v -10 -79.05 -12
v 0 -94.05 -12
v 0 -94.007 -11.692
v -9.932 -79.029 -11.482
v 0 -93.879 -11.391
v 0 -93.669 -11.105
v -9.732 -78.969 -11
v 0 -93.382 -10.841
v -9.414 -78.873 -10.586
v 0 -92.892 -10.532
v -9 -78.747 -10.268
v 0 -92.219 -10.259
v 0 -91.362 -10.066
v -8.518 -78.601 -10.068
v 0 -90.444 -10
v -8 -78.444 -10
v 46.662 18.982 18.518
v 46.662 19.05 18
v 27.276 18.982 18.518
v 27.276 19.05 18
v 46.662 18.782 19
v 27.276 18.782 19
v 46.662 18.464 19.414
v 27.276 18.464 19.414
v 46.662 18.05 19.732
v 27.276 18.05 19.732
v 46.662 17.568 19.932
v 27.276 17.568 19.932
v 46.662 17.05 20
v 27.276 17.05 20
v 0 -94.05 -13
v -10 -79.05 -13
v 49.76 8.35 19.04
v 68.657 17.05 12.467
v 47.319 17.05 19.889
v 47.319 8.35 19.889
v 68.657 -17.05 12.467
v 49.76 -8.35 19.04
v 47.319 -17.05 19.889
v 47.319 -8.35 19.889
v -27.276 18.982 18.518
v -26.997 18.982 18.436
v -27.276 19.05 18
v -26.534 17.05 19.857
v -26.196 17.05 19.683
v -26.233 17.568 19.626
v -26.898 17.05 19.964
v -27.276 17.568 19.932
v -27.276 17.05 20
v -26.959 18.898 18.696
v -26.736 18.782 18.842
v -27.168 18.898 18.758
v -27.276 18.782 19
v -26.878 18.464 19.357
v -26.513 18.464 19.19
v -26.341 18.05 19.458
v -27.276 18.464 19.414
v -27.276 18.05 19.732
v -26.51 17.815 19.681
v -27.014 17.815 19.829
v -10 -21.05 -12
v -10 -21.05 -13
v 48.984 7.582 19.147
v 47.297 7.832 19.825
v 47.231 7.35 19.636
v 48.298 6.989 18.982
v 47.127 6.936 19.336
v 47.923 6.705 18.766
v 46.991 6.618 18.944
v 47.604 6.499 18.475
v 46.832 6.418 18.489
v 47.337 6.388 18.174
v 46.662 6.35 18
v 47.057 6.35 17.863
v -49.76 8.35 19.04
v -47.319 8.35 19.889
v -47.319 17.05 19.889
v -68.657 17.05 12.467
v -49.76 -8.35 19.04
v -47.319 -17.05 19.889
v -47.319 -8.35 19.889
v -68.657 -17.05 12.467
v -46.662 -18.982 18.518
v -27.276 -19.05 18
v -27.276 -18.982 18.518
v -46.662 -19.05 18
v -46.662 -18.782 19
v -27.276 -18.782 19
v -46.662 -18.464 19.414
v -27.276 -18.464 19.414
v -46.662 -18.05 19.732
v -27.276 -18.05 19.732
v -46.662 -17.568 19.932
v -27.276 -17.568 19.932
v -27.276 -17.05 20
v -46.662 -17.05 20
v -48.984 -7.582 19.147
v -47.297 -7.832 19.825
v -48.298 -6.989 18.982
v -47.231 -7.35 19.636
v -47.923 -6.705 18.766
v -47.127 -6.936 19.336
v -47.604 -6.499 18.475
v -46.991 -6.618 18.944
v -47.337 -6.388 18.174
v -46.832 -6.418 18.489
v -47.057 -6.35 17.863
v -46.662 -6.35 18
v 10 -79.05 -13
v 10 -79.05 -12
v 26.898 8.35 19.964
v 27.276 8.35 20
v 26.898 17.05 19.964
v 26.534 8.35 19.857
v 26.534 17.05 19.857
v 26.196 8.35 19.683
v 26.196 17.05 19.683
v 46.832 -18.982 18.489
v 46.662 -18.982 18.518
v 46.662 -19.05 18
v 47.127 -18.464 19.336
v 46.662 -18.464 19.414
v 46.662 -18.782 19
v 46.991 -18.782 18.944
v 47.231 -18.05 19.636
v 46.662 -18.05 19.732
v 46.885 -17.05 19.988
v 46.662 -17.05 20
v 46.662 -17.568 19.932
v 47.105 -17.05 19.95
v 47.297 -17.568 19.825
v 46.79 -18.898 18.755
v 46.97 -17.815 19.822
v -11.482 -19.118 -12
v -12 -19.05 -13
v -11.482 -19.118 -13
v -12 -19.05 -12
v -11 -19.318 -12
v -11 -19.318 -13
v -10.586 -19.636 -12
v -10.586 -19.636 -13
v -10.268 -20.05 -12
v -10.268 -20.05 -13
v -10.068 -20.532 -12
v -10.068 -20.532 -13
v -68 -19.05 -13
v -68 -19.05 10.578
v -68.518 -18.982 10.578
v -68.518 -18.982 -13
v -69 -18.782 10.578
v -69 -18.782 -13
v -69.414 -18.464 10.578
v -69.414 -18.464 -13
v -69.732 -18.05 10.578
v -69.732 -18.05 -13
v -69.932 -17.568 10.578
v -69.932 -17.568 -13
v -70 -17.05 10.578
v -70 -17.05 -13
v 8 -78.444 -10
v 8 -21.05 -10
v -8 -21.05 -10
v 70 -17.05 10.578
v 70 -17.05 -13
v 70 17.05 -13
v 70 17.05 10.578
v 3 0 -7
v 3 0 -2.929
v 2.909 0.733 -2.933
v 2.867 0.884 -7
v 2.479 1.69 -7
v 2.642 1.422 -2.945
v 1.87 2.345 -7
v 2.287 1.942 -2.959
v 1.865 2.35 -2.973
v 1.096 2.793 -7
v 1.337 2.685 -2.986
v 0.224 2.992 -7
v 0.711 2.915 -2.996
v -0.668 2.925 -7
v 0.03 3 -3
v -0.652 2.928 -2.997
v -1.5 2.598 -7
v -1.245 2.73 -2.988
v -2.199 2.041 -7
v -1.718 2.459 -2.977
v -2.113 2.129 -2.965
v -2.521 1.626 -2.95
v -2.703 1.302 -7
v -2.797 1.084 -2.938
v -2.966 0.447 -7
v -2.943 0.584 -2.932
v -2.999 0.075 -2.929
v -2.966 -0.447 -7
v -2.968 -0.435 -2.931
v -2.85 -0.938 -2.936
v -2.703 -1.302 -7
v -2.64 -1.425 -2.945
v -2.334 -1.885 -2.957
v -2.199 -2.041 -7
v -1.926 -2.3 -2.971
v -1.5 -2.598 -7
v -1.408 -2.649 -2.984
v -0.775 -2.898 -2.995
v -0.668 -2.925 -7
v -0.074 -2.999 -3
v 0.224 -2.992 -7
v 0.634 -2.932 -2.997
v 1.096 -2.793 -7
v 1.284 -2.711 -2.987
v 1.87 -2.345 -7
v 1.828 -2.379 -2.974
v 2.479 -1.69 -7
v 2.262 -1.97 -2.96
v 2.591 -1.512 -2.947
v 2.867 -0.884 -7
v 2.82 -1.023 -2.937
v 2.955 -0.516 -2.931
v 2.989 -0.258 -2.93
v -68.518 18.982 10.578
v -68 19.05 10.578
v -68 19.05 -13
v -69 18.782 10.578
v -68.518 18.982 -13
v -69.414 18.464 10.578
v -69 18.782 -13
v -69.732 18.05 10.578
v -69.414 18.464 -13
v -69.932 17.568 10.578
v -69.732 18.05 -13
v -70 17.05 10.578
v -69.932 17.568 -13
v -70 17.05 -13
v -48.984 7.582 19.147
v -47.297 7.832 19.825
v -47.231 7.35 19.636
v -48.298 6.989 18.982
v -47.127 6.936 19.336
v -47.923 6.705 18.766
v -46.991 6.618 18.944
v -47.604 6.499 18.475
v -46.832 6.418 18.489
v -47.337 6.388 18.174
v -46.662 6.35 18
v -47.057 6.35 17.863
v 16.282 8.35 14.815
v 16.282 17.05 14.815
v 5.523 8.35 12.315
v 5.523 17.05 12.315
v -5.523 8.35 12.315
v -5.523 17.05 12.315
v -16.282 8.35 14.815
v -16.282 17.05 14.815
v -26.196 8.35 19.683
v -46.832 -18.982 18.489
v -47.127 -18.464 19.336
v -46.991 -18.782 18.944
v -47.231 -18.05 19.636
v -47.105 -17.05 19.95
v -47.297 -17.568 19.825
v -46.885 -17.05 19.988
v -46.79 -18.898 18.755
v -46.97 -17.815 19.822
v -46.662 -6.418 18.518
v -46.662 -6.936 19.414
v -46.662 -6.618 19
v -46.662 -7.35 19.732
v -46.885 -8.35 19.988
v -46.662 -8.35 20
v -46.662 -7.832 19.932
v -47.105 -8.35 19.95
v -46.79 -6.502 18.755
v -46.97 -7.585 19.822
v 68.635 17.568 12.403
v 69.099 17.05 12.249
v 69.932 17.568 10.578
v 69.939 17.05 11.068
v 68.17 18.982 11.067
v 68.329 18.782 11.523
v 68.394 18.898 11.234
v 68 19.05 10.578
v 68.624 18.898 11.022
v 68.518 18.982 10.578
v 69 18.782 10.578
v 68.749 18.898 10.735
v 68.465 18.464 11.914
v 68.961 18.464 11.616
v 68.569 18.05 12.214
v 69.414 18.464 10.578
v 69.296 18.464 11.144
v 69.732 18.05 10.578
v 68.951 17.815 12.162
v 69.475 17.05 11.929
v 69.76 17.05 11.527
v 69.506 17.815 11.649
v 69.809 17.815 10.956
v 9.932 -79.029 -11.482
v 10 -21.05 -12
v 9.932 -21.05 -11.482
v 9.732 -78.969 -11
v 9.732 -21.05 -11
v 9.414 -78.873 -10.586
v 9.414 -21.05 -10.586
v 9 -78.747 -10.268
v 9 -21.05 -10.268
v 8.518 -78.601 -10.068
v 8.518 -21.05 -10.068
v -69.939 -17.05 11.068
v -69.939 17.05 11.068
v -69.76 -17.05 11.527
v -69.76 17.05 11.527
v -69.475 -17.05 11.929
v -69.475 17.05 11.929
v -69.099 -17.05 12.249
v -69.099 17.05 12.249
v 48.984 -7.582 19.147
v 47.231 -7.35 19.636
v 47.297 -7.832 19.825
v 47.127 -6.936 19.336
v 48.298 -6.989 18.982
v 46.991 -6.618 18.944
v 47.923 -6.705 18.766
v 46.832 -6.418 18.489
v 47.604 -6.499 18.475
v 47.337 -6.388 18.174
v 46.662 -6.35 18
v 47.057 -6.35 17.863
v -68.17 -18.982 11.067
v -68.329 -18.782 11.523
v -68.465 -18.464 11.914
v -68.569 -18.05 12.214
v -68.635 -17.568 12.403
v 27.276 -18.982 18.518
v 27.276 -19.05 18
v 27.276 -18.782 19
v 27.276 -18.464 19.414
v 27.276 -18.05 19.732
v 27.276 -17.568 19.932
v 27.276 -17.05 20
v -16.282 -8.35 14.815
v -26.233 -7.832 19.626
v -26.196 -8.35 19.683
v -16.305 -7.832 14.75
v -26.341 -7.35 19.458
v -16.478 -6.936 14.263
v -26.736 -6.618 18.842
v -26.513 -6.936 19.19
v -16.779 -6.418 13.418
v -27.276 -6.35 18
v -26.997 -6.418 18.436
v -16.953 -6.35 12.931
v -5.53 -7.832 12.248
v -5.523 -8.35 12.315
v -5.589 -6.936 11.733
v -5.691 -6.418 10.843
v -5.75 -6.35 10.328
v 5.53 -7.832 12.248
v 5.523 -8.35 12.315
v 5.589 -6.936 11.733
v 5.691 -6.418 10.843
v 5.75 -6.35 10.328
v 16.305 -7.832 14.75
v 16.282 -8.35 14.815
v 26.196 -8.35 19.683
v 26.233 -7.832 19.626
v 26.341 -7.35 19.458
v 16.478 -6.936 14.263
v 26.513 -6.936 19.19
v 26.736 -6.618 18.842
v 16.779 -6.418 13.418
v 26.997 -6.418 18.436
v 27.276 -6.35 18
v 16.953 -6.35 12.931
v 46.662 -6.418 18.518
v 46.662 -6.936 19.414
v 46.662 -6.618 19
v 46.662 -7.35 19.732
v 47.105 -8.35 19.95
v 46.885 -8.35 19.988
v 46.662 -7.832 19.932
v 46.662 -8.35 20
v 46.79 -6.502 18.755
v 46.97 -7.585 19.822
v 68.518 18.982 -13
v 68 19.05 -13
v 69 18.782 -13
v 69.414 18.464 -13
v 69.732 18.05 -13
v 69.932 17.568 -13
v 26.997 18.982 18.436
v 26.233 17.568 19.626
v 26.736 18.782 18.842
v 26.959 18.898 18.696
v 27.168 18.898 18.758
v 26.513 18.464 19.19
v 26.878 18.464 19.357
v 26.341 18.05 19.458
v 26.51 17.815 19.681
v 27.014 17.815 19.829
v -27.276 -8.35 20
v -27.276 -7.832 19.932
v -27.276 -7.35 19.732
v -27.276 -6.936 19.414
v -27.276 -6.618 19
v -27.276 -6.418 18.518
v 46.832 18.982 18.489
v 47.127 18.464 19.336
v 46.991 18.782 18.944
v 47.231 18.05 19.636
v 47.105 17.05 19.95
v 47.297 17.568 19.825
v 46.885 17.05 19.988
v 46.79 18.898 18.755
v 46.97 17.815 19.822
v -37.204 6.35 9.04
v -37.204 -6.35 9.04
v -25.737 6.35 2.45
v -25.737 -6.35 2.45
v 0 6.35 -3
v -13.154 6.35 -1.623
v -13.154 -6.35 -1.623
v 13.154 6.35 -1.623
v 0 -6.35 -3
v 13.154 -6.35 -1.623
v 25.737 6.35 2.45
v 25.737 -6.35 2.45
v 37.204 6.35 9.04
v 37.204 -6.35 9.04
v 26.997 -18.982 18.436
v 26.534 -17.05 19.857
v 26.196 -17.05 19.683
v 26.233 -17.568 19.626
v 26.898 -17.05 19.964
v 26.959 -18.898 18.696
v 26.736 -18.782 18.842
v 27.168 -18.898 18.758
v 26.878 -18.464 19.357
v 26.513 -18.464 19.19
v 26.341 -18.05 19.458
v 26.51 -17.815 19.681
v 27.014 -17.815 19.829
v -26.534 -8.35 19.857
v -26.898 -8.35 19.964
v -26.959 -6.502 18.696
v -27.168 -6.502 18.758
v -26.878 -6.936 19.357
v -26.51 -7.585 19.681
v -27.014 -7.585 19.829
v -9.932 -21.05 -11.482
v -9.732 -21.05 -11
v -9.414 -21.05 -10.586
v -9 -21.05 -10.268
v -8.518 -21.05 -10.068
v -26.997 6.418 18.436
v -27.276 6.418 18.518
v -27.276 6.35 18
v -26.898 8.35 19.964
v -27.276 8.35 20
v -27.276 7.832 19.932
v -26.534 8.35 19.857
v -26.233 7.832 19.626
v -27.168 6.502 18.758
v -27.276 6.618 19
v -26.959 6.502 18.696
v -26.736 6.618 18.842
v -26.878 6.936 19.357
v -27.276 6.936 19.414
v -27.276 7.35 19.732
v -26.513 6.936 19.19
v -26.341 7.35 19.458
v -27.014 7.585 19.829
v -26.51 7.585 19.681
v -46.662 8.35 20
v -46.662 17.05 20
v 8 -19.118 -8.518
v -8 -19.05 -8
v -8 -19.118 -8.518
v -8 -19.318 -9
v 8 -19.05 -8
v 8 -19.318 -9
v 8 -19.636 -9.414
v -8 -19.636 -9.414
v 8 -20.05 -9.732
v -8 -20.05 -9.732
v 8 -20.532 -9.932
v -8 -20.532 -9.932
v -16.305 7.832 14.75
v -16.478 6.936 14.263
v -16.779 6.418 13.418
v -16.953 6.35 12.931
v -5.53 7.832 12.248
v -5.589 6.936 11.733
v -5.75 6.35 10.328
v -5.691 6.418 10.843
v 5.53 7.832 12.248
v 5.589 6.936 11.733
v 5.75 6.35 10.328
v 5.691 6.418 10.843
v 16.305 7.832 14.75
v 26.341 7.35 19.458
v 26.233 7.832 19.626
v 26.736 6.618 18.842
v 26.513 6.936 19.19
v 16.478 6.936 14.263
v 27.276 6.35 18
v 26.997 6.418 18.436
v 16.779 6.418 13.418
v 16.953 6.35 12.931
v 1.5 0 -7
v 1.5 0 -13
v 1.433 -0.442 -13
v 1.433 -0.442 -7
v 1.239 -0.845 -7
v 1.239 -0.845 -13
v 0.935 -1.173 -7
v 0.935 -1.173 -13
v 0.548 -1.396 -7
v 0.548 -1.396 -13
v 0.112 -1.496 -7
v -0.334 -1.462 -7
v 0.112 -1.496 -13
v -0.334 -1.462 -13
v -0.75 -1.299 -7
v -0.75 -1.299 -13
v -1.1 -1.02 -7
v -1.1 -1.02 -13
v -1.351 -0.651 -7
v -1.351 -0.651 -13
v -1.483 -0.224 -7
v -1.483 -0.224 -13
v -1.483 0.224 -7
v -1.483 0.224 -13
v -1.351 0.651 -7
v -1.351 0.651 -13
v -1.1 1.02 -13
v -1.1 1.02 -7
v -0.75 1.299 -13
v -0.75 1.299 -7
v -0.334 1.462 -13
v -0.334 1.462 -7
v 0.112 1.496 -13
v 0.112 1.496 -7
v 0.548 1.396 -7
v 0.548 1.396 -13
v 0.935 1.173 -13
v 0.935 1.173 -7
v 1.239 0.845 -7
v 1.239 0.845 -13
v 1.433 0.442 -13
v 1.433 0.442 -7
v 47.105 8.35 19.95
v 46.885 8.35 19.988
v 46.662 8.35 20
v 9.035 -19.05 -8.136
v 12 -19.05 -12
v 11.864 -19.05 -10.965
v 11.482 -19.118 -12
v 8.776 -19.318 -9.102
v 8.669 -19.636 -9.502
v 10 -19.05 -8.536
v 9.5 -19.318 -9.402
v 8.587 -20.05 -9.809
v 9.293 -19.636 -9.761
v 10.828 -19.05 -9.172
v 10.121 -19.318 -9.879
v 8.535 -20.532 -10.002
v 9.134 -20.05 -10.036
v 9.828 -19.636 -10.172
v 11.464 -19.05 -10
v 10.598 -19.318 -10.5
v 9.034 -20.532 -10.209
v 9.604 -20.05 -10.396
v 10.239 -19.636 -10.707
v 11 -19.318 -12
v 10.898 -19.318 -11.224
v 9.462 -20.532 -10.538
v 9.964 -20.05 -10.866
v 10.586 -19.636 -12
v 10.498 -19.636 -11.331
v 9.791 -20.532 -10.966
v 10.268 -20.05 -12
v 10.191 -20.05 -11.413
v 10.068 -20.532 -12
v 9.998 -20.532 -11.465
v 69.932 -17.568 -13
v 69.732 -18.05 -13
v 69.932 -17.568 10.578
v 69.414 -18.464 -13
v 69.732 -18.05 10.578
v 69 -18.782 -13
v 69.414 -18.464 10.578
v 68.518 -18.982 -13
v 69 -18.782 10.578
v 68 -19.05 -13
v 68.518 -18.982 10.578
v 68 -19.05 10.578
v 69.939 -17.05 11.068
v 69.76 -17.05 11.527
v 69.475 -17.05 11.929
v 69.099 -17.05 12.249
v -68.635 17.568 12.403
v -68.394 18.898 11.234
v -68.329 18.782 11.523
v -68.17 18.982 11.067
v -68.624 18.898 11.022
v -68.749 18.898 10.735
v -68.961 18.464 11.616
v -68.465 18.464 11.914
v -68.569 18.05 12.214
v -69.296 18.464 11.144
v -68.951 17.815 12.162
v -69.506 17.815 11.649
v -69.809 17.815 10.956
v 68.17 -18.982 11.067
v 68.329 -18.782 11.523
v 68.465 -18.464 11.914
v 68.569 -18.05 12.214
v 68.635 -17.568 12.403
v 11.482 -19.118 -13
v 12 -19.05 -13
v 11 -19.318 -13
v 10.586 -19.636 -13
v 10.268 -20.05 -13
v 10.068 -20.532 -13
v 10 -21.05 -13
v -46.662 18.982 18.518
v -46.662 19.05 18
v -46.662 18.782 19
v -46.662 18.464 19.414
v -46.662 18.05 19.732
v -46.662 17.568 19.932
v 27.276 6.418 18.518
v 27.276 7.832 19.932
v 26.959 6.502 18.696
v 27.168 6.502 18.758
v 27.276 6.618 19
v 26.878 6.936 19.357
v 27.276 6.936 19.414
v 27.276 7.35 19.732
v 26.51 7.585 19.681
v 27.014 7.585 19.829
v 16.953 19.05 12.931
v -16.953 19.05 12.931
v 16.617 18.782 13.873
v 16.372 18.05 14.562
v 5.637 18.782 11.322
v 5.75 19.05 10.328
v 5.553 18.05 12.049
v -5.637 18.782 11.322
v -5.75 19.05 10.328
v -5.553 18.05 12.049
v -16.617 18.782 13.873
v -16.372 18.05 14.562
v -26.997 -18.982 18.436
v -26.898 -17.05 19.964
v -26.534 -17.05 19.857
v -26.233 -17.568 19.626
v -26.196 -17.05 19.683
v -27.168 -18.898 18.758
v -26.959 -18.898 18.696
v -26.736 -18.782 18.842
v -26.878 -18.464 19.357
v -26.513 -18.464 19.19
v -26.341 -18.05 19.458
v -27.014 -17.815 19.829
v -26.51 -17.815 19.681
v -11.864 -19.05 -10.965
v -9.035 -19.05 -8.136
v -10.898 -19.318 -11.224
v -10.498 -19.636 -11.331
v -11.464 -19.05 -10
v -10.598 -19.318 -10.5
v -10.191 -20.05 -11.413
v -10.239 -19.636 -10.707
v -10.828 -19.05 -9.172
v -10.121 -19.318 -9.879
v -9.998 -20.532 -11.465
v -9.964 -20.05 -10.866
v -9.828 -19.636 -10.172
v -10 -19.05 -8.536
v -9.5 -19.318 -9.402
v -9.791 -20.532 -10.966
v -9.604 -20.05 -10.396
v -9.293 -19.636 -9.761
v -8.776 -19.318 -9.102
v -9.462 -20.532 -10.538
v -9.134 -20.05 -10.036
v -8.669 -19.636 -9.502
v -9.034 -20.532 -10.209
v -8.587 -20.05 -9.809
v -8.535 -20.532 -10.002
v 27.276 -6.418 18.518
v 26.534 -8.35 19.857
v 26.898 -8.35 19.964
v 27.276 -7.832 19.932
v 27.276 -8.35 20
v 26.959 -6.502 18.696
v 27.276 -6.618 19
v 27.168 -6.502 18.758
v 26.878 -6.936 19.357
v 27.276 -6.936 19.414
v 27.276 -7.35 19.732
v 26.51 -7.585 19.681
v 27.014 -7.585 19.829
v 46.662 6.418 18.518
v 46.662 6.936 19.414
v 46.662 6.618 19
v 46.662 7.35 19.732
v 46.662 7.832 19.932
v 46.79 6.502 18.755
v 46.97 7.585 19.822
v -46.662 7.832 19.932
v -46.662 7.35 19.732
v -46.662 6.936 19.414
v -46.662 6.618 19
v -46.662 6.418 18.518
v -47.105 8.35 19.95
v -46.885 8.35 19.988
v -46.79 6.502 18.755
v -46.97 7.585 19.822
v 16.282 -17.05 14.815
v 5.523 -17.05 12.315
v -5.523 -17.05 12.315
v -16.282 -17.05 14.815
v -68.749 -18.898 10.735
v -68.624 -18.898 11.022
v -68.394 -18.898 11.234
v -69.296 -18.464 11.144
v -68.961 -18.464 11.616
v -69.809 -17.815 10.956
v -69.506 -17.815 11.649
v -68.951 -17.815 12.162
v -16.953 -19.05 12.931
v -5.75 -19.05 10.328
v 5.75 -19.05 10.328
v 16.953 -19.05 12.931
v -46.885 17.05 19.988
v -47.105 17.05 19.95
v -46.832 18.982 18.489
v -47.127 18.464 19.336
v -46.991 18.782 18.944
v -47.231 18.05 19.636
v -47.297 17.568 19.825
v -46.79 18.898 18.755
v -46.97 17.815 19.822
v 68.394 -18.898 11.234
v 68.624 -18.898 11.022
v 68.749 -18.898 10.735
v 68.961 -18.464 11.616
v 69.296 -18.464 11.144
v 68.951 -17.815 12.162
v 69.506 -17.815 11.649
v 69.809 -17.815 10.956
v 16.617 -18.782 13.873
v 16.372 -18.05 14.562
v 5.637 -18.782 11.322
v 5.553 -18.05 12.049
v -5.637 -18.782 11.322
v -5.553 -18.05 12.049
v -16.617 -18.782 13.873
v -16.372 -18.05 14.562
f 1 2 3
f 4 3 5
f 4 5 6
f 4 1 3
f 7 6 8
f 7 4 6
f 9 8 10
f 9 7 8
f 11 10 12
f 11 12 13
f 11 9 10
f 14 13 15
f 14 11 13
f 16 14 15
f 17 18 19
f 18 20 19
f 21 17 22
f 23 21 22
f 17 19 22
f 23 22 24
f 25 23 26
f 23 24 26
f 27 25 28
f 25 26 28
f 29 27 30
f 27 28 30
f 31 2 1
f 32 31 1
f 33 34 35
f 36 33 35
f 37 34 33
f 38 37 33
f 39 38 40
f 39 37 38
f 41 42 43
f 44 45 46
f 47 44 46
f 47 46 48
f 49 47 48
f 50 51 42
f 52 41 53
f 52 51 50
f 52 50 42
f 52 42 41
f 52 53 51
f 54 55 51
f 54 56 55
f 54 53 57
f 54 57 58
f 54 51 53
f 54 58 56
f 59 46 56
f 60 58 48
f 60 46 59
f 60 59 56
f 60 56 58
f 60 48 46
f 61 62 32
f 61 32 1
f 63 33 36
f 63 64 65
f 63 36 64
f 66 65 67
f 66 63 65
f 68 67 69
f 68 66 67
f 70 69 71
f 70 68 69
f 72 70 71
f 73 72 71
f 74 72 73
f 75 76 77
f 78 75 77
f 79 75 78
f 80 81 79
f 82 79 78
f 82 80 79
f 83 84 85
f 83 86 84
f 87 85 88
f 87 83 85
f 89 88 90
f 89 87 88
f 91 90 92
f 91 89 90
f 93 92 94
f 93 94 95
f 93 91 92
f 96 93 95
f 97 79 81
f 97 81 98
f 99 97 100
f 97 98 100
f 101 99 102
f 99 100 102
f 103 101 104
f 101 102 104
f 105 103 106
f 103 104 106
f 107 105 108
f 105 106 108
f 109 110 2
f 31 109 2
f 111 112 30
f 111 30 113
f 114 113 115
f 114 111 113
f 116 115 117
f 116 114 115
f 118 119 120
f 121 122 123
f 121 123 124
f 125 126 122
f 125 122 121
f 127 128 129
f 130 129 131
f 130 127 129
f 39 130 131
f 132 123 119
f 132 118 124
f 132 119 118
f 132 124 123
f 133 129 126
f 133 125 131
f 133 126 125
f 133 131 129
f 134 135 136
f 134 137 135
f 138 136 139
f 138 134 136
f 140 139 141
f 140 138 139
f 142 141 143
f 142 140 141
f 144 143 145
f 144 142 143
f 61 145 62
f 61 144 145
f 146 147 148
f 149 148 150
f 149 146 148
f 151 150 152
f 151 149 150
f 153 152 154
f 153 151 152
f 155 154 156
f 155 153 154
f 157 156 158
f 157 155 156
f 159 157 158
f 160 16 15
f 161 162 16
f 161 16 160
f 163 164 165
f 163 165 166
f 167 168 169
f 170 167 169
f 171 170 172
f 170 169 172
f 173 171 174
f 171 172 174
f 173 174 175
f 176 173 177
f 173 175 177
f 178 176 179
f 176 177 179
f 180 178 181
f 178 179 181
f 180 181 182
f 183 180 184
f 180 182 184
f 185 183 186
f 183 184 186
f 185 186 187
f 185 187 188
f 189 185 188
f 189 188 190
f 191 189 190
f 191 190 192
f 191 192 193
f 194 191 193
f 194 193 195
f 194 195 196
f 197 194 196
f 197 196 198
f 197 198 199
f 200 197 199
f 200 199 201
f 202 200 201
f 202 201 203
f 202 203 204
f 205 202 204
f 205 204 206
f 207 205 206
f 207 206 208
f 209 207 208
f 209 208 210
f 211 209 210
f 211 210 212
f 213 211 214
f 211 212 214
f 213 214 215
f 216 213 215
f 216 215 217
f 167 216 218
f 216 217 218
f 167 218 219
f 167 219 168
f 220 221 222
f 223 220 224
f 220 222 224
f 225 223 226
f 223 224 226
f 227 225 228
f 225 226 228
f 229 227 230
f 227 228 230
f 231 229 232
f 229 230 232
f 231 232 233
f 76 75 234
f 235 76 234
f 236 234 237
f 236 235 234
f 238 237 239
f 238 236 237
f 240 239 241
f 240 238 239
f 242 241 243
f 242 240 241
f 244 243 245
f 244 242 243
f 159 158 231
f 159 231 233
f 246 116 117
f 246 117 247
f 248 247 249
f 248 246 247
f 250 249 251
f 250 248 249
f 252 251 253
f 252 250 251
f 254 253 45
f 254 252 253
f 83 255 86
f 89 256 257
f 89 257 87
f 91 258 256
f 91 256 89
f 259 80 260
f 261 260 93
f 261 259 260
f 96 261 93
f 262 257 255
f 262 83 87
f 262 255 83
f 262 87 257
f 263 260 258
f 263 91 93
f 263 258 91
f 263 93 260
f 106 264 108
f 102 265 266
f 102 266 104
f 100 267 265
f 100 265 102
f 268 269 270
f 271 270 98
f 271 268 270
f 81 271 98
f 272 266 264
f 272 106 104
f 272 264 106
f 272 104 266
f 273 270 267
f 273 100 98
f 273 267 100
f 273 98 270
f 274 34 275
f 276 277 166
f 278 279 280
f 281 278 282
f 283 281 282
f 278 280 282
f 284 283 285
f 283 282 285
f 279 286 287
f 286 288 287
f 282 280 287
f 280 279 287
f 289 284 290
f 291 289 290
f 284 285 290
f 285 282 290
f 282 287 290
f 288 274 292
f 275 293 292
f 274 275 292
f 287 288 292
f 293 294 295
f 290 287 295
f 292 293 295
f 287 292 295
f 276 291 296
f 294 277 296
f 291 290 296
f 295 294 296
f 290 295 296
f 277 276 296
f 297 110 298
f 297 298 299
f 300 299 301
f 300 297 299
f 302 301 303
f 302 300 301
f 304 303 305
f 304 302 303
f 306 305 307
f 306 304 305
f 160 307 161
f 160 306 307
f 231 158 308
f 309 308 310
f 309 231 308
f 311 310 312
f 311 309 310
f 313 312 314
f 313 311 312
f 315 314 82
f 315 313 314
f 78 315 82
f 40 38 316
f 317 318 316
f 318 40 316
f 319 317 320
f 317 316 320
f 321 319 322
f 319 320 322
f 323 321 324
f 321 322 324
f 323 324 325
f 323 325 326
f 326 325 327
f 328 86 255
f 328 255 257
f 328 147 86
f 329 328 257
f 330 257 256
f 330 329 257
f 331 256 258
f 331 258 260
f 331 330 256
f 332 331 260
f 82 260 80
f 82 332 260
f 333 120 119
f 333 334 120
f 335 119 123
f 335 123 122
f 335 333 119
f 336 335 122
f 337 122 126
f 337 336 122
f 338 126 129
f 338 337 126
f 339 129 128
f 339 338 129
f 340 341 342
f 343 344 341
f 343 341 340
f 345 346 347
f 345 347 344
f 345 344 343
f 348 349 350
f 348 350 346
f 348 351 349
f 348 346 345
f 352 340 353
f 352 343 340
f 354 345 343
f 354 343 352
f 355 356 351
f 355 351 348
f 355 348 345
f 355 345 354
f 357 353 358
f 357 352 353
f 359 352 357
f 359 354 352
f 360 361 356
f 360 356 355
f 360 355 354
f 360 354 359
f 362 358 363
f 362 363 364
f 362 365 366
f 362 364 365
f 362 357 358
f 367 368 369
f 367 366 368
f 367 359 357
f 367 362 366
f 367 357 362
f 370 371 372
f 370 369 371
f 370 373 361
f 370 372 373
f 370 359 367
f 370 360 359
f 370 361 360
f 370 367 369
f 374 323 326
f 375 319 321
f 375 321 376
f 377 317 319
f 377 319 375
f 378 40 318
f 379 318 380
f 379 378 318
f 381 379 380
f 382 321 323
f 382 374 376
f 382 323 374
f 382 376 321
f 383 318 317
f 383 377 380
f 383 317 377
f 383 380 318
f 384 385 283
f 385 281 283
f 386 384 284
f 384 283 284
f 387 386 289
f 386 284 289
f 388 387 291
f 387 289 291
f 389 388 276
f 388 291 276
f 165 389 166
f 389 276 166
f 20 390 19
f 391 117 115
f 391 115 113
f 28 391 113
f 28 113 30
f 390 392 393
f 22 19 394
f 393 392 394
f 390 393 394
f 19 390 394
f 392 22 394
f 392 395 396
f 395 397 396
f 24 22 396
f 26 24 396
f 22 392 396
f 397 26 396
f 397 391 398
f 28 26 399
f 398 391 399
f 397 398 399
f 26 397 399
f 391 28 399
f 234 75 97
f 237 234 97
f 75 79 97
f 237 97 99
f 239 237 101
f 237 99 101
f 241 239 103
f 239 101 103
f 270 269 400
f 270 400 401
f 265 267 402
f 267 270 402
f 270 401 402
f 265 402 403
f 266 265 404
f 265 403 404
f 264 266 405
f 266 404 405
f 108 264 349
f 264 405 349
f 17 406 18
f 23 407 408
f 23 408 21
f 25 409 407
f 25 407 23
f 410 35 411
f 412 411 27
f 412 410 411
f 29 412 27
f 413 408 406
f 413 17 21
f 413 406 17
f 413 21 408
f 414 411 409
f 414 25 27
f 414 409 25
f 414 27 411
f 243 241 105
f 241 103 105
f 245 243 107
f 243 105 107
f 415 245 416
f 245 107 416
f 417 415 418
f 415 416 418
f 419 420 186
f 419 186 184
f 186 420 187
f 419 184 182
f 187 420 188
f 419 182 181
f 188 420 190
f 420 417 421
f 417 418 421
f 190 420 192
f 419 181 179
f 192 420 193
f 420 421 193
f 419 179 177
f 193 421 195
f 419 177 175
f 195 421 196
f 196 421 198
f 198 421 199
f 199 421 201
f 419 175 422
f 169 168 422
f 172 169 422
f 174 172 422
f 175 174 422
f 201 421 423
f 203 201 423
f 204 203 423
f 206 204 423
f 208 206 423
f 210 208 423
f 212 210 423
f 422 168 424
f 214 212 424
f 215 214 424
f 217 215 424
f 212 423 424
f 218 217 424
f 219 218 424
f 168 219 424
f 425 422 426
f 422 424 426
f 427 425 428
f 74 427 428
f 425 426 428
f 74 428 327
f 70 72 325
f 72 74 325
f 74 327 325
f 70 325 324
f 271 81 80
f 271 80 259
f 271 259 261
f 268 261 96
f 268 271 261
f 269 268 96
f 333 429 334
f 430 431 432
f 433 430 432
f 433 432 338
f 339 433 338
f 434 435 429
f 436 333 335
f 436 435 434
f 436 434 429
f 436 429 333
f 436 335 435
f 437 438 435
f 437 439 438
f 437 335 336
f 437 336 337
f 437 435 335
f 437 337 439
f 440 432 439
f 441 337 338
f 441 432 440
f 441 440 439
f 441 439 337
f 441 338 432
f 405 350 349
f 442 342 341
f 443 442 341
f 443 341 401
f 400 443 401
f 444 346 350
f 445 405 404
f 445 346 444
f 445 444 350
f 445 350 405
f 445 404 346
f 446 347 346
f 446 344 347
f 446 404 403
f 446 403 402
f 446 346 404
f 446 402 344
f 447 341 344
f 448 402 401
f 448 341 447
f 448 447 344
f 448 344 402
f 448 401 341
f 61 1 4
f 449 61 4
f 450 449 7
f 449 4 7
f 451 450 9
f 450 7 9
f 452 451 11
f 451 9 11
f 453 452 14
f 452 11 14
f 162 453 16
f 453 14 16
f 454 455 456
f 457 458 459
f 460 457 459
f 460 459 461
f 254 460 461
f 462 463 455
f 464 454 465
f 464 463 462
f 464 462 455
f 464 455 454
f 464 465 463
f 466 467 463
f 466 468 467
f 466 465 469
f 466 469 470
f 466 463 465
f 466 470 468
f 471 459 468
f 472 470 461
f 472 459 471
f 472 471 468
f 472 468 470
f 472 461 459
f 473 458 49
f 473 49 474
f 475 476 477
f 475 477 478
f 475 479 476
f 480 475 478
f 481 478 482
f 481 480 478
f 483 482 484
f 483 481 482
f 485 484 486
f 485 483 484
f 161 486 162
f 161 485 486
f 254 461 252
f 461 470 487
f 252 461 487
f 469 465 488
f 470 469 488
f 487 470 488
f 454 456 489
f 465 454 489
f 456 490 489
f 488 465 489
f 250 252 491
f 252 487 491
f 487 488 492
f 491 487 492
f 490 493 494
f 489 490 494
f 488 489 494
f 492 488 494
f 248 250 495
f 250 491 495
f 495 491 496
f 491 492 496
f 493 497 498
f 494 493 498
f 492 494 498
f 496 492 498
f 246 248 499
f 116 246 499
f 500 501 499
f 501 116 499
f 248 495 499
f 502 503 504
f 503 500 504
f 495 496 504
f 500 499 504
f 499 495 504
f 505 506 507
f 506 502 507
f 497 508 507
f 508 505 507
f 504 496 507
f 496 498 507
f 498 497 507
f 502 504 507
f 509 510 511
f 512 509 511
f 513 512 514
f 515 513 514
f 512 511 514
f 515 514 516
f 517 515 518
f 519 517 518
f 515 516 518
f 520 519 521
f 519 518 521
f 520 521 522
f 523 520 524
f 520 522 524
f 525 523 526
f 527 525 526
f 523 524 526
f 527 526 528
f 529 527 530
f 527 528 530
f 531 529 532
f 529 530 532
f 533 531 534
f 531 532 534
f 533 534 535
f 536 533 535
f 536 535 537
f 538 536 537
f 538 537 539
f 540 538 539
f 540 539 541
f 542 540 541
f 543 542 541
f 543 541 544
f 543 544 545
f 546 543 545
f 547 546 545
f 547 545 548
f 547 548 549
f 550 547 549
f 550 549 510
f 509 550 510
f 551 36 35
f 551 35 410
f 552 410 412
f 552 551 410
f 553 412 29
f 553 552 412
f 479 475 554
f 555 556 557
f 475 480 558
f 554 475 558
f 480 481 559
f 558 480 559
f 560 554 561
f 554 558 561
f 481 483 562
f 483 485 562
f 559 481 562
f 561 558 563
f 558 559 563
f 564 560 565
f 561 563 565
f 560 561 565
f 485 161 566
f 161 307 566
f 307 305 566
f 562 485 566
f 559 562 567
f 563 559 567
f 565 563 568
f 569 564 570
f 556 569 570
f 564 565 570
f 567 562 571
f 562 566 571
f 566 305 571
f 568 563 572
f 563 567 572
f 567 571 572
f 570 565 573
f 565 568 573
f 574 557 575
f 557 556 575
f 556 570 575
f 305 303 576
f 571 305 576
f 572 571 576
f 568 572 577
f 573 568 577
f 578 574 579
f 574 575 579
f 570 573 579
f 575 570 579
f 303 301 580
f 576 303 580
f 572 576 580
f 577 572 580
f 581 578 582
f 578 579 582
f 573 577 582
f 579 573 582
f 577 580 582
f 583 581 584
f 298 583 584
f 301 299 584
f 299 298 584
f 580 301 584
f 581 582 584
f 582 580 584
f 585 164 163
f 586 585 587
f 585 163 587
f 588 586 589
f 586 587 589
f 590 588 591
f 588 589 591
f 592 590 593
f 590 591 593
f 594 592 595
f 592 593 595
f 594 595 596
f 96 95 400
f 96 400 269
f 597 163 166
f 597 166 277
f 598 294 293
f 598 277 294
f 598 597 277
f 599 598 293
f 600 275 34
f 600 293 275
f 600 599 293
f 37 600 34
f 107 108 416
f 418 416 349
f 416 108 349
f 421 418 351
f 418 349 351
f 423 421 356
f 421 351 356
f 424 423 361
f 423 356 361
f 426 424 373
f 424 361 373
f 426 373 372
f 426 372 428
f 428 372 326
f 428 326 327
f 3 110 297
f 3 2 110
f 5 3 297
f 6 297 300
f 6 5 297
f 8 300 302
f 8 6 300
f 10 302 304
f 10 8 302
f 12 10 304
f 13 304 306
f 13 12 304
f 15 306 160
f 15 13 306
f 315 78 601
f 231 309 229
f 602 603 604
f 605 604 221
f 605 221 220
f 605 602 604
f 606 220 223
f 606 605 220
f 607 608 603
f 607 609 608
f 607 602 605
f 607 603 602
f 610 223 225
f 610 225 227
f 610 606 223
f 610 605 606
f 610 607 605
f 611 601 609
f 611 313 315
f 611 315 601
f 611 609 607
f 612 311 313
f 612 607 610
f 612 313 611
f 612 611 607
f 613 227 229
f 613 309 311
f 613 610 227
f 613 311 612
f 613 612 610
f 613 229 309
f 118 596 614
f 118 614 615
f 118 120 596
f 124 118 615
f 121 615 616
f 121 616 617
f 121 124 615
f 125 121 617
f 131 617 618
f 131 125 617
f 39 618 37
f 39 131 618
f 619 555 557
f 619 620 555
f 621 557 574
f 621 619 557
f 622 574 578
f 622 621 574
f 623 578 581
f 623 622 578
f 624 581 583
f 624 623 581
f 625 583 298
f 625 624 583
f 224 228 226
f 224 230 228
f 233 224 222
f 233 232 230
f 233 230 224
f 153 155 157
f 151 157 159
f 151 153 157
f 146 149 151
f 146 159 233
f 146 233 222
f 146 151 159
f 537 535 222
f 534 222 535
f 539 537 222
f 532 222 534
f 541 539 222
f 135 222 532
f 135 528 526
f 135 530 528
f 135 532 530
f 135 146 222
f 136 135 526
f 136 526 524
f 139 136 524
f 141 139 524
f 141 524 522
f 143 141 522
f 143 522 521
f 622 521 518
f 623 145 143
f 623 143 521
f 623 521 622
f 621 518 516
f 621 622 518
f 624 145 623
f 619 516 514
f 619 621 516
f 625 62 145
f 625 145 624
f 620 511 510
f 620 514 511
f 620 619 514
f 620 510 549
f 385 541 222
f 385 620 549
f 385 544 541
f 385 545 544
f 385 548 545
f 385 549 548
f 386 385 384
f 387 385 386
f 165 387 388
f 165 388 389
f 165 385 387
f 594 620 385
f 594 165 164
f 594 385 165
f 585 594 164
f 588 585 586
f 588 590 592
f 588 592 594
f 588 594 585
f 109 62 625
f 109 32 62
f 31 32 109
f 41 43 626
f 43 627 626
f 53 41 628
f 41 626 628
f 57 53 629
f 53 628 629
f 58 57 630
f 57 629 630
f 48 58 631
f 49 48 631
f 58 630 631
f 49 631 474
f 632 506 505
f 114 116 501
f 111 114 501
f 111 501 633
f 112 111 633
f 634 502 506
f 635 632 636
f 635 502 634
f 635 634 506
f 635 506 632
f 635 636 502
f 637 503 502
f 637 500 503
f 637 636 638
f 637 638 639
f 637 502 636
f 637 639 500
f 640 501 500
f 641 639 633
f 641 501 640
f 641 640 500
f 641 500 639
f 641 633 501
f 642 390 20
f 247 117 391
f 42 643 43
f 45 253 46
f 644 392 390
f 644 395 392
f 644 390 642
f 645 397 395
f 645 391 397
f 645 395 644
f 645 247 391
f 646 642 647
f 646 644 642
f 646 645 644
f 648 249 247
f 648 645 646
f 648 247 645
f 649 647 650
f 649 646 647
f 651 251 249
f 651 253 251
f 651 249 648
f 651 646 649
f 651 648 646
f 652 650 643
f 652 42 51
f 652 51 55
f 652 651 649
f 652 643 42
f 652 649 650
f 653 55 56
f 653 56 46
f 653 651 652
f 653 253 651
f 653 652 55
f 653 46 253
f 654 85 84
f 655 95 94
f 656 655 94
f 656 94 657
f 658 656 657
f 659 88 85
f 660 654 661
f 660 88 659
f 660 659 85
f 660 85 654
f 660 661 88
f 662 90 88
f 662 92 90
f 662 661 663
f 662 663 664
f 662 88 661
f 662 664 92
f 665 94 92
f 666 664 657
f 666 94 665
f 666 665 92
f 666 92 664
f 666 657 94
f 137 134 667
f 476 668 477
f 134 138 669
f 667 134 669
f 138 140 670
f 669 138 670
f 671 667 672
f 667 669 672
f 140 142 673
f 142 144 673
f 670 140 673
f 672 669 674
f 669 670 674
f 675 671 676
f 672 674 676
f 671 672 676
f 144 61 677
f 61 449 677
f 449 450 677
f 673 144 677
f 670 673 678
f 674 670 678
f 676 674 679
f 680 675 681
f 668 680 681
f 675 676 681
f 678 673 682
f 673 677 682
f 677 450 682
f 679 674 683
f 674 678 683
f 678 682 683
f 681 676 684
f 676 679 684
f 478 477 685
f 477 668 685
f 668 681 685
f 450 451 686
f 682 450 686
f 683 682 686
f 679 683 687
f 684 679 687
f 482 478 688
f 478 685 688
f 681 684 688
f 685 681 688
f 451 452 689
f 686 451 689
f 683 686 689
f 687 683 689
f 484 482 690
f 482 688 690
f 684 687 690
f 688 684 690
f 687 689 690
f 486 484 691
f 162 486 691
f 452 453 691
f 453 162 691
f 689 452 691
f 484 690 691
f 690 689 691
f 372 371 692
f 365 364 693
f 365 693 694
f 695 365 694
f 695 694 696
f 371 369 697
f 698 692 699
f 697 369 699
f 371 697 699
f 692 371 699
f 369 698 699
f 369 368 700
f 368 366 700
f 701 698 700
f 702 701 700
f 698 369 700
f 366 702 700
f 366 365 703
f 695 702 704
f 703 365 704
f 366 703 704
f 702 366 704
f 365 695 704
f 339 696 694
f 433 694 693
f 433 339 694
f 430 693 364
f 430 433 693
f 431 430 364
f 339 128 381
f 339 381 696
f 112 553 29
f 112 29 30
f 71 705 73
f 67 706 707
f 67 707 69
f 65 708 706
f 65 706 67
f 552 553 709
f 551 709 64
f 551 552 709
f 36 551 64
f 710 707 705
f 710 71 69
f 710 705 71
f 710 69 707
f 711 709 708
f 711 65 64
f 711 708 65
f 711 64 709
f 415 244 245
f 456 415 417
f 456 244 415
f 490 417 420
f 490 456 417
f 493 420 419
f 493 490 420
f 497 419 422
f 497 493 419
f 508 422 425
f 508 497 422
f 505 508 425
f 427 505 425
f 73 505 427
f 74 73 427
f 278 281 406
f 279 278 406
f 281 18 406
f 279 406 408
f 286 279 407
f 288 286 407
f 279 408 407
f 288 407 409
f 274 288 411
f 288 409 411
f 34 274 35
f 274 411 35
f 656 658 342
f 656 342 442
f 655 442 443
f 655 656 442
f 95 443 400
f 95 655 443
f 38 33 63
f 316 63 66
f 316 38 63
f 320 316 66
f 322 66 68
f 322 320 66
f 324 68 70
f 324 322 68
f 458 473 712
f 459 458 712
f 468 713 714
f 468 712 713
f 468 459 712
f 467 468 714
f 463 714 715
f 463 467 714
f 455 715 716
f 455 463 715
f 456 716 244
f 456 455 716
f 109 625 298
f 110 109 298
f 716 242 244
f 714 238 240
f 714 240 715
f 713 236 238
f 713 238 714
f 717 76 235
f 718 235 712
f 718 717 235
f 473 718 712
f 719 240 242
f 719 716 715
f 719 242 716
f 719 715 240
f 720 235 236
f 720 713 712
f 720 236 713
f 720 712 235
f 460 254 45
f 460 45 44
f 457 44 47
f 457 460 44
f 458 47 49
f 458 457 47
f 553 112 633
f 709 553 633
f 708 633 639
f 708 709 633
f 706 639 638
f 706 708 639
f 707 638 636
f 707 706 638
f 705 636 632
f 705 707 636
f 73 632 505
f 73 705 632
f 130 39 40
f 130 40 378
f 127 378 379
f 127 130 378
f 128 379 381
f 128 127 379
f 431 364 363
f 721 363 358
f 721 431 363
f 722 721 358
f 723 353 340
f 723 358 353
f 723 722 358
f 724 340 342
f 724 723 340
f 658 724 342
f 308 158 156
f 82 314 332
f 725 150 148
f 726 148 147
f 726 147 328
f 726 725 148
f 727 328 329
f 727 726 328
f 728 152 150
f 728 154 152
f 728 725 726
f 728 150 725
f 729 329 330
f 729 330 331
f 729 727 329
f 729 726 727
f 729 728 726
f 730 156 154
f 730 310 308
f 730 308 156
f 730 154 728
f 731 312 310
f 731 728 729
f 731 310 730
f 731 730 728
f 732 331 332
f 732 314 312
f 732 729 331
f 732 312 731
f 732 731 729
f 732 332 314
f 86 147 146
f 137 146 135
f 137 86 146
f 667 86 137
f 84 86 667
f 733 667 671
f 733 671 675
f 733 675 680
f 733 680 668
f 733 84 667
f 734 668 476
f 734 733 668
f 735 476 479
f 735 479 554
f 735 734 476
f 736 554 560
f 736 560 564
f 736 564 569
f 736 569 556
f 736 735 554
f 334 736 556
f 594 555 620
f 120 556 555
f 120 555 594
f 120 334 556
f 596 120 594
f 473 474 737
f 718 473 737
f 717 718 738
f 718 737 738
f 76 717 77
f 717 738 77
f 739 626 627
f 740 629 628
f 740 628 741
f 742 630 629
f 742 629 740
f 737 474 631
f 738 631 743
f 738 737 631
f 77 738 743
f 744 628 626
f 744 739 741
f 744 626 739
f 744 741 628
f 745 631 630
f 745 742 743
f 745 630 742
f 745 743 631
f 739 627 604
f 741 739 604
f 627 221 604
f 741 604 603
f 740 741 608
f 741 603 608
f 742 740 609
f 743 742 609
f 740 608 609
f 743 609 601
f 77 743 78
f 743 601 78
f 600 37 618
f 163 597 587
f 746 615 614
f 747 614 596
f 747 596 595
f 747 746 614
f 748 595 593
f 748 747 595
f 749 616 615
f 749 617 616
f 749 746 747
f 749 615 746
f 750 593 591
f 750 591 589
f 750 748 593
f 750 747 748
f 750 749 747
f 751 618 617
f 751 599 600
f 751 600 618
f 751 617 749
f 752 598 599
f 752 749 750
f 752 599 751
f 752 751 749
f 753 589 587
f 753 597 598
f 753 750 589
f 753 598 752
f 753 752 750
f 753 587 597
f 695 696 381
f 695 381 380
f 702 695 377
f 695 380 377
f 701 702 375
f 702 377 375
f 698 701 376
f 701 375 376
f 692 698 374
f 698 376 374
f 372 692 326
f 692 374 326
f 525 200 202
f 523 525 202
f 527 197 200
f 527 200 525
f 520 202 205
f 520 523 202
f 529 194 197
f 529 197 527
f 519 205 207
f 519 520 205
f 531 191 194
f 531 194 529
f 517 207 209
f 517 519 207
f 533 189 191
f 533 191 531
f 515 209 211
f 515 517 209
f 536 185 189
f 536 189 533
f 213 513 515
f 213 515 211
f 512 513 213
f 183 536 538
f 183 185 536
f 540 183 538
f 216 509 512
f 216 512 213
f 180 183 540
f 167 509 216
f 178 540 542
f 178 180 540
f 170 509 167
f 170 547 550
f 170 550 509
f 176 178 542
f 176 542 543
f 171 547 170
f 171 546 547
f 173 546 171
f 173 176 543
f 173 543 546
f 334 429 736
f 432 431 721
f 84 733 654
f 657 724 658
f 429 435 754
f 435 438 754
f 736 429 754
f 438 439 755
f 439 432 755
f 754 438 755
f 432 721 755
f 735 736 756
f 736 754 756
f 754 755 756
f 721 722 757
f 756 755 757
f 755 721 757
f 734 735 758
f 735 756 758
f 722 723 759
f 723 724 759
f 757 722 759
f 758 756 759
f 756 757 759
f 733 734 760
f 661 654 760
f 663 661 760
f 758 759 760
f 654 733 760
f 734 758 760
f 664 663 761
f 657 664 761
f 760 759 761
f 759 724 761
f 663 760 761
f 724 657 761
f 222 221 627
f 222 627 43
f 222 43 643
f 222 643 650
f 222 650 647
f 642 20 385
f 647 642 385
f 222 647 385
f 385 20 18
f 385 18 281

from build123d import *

# Parameters (mm, degrees)
F1_DEPTH  = 19.05
F2_R      = 63.5
F3_DEPTH  = 6.35
F4_R      = 2
F5_R      = 1.5
F6_DEPTH  = 33.001
F7_R      = 3
F8_DEPTH  = 7
F9_W      = 20
F9_H      = 3
F10_DEPTH = 75
F12_DEPTH = 3.001
F13_F1_R  = 2
F13_F2_R  = 2


with BuildPart() as f1:
    # F0 (on Front) → F1 (new body, symmetric)
    with BuildSketch(Plane.XZ):
        with BuildLine():
            Line((-70, -13), (70, -13))
            Line((70, -13), (70, 12))
            Line((70, 12), (47, 20))
            Line((47, 20), (26.6833281283, 20))
            ThreePointArc((26.6833281283, 20), (0, 12), (-26.6833281283, 20))
            Line((-26.6833281283, 20), (-47, 20))
            Line((-47, 20), (-70, 12))
            Line((-70, 12), (-70, -13))
        make_face()
    extrude(amount=F1_DEPTH, both=True)

    # F2 (on Front) → F3 (cut, symmetric)
    with BuildSketch(Plane.XZ):
        with Locations((0, 60.5)):
            Circle(F2_R)
    extrude(amount=F3_DEPTH, both=True, mode=Mode.SUBTRACT)

    # F4
    f4_edges = [f1.edges().sort_by_distance(p)[0] for p in [
        (-70, -19.05, -0.5),
        (-58.5, -19.05, 16),
        (-36.841664, -19.05, 20),
        (0, -19.05, 12),
        (36.841664, -19.05, 20),
        (58.5, -19.05, 16),
        (70, -19.05, -0.5),
        (70, 0, 12),
        (47, -12.7, 20),
        (26.683328, -12.7, 20),
        (26.683328, 12.7, 20),
        (47.738913, -6.35, 19.742987),
        (48.477826, 0, 19.485974),
        (47.738913, 6.35, 19.742987),
        (47, 12.7, 20),
        (58.5, 19.05, 16),
        (70, 19.05, -0.5),
        (0, 6.35, 12),
        (-26.683328, 12.7, 20),
        (0, 19.05, 12),
        (-26.683328, -12.7, 20),
        (0, -6.35, 12),
        (-47, -12.7, 20),
        (-36.841664, -6.35, 20),
        (-36.841664, 6.35, 20),
        (-47, 12.7, 20),
        (-36.841664, 19.05, 20),
        (-47.738913, 6.35, 19.742987),
        (-48.477826, 0, 19.485974),
        (-47.738913, -6.35, 19.742987),
        (-70, 0, 12),
        (-58.5, 19.05, 16),
        (-70, 19.05, -0.5),
        (36.841664, 6.35, 20),
        (36.841664, 19.05, 20),
        (36.841664, -6.35, 20),
    ]]
    fillet(f4_edges, radius=F4_R)

    # F5 (on face) → F6 (cut, through all)
    with BuildSketch(Plane(origin=(0, 0, -13), x_dir=(1, 0, 0), z_dir=(0, 0, -1))):
        Circle(F5_R)
    extrude(amount=-F6_DEPTH, mode=Mode.SUBTRACT)

    # F7 (on Top) → F8 (cut)
    with BuildSketch(Plane.XY):
        Circle(F7_R)
    extrude(amount=-F8_DEPTH, mode=Mode.SUBTRACT)

    # F9 (on face) → F10 (join)
    with BuildSketch(Plane.XZ.offset(19.05)):
        with Locations((0, -11.5)):
            Rectangle(F9_W, F9_H)
    extrude(amount=F10_DEPTH)

    # F11 (on face) → F12 (cut, through all)
    with BuildSketch(Plane.XY.offset(-10)):
        Polygon((-10, -94.05), (0, -94.05), (-10, -79.05), align=None)
        Polygon((10, -79.05), (0, -94.05), (10, -94.05), align=None)
    extrude(amount=-F12_DEPTH, mode=Mode.SUBTRACT)

    # F13: fillet of radius 2 on 5 edges, made by hand

    # F13_f1
    f13_f1_edges = [f1.edges().sort_by_distance(p)[0] for p in [
        (-10, -49.05, -10),
        (-5, -86.55, -10),
        (5, -86.55, -10),
        (10, -49.05, -10),
    ]]
    fillet(f13_f1_edges, radius=F13_F1_R)

    # F13_f2
    f13_f2_edges = [f1.edges().sort_by_distance(p)[0] for p in [
        (0, -19.05, -10),
        (9.4142135624, -19.05, -10.5857864376),
        (-9.4142135624, -19.05, -10.5857864376),
    ]]
    fillet(f13_f2_edges, radius=F13_F2_R)


solid = f1.part
